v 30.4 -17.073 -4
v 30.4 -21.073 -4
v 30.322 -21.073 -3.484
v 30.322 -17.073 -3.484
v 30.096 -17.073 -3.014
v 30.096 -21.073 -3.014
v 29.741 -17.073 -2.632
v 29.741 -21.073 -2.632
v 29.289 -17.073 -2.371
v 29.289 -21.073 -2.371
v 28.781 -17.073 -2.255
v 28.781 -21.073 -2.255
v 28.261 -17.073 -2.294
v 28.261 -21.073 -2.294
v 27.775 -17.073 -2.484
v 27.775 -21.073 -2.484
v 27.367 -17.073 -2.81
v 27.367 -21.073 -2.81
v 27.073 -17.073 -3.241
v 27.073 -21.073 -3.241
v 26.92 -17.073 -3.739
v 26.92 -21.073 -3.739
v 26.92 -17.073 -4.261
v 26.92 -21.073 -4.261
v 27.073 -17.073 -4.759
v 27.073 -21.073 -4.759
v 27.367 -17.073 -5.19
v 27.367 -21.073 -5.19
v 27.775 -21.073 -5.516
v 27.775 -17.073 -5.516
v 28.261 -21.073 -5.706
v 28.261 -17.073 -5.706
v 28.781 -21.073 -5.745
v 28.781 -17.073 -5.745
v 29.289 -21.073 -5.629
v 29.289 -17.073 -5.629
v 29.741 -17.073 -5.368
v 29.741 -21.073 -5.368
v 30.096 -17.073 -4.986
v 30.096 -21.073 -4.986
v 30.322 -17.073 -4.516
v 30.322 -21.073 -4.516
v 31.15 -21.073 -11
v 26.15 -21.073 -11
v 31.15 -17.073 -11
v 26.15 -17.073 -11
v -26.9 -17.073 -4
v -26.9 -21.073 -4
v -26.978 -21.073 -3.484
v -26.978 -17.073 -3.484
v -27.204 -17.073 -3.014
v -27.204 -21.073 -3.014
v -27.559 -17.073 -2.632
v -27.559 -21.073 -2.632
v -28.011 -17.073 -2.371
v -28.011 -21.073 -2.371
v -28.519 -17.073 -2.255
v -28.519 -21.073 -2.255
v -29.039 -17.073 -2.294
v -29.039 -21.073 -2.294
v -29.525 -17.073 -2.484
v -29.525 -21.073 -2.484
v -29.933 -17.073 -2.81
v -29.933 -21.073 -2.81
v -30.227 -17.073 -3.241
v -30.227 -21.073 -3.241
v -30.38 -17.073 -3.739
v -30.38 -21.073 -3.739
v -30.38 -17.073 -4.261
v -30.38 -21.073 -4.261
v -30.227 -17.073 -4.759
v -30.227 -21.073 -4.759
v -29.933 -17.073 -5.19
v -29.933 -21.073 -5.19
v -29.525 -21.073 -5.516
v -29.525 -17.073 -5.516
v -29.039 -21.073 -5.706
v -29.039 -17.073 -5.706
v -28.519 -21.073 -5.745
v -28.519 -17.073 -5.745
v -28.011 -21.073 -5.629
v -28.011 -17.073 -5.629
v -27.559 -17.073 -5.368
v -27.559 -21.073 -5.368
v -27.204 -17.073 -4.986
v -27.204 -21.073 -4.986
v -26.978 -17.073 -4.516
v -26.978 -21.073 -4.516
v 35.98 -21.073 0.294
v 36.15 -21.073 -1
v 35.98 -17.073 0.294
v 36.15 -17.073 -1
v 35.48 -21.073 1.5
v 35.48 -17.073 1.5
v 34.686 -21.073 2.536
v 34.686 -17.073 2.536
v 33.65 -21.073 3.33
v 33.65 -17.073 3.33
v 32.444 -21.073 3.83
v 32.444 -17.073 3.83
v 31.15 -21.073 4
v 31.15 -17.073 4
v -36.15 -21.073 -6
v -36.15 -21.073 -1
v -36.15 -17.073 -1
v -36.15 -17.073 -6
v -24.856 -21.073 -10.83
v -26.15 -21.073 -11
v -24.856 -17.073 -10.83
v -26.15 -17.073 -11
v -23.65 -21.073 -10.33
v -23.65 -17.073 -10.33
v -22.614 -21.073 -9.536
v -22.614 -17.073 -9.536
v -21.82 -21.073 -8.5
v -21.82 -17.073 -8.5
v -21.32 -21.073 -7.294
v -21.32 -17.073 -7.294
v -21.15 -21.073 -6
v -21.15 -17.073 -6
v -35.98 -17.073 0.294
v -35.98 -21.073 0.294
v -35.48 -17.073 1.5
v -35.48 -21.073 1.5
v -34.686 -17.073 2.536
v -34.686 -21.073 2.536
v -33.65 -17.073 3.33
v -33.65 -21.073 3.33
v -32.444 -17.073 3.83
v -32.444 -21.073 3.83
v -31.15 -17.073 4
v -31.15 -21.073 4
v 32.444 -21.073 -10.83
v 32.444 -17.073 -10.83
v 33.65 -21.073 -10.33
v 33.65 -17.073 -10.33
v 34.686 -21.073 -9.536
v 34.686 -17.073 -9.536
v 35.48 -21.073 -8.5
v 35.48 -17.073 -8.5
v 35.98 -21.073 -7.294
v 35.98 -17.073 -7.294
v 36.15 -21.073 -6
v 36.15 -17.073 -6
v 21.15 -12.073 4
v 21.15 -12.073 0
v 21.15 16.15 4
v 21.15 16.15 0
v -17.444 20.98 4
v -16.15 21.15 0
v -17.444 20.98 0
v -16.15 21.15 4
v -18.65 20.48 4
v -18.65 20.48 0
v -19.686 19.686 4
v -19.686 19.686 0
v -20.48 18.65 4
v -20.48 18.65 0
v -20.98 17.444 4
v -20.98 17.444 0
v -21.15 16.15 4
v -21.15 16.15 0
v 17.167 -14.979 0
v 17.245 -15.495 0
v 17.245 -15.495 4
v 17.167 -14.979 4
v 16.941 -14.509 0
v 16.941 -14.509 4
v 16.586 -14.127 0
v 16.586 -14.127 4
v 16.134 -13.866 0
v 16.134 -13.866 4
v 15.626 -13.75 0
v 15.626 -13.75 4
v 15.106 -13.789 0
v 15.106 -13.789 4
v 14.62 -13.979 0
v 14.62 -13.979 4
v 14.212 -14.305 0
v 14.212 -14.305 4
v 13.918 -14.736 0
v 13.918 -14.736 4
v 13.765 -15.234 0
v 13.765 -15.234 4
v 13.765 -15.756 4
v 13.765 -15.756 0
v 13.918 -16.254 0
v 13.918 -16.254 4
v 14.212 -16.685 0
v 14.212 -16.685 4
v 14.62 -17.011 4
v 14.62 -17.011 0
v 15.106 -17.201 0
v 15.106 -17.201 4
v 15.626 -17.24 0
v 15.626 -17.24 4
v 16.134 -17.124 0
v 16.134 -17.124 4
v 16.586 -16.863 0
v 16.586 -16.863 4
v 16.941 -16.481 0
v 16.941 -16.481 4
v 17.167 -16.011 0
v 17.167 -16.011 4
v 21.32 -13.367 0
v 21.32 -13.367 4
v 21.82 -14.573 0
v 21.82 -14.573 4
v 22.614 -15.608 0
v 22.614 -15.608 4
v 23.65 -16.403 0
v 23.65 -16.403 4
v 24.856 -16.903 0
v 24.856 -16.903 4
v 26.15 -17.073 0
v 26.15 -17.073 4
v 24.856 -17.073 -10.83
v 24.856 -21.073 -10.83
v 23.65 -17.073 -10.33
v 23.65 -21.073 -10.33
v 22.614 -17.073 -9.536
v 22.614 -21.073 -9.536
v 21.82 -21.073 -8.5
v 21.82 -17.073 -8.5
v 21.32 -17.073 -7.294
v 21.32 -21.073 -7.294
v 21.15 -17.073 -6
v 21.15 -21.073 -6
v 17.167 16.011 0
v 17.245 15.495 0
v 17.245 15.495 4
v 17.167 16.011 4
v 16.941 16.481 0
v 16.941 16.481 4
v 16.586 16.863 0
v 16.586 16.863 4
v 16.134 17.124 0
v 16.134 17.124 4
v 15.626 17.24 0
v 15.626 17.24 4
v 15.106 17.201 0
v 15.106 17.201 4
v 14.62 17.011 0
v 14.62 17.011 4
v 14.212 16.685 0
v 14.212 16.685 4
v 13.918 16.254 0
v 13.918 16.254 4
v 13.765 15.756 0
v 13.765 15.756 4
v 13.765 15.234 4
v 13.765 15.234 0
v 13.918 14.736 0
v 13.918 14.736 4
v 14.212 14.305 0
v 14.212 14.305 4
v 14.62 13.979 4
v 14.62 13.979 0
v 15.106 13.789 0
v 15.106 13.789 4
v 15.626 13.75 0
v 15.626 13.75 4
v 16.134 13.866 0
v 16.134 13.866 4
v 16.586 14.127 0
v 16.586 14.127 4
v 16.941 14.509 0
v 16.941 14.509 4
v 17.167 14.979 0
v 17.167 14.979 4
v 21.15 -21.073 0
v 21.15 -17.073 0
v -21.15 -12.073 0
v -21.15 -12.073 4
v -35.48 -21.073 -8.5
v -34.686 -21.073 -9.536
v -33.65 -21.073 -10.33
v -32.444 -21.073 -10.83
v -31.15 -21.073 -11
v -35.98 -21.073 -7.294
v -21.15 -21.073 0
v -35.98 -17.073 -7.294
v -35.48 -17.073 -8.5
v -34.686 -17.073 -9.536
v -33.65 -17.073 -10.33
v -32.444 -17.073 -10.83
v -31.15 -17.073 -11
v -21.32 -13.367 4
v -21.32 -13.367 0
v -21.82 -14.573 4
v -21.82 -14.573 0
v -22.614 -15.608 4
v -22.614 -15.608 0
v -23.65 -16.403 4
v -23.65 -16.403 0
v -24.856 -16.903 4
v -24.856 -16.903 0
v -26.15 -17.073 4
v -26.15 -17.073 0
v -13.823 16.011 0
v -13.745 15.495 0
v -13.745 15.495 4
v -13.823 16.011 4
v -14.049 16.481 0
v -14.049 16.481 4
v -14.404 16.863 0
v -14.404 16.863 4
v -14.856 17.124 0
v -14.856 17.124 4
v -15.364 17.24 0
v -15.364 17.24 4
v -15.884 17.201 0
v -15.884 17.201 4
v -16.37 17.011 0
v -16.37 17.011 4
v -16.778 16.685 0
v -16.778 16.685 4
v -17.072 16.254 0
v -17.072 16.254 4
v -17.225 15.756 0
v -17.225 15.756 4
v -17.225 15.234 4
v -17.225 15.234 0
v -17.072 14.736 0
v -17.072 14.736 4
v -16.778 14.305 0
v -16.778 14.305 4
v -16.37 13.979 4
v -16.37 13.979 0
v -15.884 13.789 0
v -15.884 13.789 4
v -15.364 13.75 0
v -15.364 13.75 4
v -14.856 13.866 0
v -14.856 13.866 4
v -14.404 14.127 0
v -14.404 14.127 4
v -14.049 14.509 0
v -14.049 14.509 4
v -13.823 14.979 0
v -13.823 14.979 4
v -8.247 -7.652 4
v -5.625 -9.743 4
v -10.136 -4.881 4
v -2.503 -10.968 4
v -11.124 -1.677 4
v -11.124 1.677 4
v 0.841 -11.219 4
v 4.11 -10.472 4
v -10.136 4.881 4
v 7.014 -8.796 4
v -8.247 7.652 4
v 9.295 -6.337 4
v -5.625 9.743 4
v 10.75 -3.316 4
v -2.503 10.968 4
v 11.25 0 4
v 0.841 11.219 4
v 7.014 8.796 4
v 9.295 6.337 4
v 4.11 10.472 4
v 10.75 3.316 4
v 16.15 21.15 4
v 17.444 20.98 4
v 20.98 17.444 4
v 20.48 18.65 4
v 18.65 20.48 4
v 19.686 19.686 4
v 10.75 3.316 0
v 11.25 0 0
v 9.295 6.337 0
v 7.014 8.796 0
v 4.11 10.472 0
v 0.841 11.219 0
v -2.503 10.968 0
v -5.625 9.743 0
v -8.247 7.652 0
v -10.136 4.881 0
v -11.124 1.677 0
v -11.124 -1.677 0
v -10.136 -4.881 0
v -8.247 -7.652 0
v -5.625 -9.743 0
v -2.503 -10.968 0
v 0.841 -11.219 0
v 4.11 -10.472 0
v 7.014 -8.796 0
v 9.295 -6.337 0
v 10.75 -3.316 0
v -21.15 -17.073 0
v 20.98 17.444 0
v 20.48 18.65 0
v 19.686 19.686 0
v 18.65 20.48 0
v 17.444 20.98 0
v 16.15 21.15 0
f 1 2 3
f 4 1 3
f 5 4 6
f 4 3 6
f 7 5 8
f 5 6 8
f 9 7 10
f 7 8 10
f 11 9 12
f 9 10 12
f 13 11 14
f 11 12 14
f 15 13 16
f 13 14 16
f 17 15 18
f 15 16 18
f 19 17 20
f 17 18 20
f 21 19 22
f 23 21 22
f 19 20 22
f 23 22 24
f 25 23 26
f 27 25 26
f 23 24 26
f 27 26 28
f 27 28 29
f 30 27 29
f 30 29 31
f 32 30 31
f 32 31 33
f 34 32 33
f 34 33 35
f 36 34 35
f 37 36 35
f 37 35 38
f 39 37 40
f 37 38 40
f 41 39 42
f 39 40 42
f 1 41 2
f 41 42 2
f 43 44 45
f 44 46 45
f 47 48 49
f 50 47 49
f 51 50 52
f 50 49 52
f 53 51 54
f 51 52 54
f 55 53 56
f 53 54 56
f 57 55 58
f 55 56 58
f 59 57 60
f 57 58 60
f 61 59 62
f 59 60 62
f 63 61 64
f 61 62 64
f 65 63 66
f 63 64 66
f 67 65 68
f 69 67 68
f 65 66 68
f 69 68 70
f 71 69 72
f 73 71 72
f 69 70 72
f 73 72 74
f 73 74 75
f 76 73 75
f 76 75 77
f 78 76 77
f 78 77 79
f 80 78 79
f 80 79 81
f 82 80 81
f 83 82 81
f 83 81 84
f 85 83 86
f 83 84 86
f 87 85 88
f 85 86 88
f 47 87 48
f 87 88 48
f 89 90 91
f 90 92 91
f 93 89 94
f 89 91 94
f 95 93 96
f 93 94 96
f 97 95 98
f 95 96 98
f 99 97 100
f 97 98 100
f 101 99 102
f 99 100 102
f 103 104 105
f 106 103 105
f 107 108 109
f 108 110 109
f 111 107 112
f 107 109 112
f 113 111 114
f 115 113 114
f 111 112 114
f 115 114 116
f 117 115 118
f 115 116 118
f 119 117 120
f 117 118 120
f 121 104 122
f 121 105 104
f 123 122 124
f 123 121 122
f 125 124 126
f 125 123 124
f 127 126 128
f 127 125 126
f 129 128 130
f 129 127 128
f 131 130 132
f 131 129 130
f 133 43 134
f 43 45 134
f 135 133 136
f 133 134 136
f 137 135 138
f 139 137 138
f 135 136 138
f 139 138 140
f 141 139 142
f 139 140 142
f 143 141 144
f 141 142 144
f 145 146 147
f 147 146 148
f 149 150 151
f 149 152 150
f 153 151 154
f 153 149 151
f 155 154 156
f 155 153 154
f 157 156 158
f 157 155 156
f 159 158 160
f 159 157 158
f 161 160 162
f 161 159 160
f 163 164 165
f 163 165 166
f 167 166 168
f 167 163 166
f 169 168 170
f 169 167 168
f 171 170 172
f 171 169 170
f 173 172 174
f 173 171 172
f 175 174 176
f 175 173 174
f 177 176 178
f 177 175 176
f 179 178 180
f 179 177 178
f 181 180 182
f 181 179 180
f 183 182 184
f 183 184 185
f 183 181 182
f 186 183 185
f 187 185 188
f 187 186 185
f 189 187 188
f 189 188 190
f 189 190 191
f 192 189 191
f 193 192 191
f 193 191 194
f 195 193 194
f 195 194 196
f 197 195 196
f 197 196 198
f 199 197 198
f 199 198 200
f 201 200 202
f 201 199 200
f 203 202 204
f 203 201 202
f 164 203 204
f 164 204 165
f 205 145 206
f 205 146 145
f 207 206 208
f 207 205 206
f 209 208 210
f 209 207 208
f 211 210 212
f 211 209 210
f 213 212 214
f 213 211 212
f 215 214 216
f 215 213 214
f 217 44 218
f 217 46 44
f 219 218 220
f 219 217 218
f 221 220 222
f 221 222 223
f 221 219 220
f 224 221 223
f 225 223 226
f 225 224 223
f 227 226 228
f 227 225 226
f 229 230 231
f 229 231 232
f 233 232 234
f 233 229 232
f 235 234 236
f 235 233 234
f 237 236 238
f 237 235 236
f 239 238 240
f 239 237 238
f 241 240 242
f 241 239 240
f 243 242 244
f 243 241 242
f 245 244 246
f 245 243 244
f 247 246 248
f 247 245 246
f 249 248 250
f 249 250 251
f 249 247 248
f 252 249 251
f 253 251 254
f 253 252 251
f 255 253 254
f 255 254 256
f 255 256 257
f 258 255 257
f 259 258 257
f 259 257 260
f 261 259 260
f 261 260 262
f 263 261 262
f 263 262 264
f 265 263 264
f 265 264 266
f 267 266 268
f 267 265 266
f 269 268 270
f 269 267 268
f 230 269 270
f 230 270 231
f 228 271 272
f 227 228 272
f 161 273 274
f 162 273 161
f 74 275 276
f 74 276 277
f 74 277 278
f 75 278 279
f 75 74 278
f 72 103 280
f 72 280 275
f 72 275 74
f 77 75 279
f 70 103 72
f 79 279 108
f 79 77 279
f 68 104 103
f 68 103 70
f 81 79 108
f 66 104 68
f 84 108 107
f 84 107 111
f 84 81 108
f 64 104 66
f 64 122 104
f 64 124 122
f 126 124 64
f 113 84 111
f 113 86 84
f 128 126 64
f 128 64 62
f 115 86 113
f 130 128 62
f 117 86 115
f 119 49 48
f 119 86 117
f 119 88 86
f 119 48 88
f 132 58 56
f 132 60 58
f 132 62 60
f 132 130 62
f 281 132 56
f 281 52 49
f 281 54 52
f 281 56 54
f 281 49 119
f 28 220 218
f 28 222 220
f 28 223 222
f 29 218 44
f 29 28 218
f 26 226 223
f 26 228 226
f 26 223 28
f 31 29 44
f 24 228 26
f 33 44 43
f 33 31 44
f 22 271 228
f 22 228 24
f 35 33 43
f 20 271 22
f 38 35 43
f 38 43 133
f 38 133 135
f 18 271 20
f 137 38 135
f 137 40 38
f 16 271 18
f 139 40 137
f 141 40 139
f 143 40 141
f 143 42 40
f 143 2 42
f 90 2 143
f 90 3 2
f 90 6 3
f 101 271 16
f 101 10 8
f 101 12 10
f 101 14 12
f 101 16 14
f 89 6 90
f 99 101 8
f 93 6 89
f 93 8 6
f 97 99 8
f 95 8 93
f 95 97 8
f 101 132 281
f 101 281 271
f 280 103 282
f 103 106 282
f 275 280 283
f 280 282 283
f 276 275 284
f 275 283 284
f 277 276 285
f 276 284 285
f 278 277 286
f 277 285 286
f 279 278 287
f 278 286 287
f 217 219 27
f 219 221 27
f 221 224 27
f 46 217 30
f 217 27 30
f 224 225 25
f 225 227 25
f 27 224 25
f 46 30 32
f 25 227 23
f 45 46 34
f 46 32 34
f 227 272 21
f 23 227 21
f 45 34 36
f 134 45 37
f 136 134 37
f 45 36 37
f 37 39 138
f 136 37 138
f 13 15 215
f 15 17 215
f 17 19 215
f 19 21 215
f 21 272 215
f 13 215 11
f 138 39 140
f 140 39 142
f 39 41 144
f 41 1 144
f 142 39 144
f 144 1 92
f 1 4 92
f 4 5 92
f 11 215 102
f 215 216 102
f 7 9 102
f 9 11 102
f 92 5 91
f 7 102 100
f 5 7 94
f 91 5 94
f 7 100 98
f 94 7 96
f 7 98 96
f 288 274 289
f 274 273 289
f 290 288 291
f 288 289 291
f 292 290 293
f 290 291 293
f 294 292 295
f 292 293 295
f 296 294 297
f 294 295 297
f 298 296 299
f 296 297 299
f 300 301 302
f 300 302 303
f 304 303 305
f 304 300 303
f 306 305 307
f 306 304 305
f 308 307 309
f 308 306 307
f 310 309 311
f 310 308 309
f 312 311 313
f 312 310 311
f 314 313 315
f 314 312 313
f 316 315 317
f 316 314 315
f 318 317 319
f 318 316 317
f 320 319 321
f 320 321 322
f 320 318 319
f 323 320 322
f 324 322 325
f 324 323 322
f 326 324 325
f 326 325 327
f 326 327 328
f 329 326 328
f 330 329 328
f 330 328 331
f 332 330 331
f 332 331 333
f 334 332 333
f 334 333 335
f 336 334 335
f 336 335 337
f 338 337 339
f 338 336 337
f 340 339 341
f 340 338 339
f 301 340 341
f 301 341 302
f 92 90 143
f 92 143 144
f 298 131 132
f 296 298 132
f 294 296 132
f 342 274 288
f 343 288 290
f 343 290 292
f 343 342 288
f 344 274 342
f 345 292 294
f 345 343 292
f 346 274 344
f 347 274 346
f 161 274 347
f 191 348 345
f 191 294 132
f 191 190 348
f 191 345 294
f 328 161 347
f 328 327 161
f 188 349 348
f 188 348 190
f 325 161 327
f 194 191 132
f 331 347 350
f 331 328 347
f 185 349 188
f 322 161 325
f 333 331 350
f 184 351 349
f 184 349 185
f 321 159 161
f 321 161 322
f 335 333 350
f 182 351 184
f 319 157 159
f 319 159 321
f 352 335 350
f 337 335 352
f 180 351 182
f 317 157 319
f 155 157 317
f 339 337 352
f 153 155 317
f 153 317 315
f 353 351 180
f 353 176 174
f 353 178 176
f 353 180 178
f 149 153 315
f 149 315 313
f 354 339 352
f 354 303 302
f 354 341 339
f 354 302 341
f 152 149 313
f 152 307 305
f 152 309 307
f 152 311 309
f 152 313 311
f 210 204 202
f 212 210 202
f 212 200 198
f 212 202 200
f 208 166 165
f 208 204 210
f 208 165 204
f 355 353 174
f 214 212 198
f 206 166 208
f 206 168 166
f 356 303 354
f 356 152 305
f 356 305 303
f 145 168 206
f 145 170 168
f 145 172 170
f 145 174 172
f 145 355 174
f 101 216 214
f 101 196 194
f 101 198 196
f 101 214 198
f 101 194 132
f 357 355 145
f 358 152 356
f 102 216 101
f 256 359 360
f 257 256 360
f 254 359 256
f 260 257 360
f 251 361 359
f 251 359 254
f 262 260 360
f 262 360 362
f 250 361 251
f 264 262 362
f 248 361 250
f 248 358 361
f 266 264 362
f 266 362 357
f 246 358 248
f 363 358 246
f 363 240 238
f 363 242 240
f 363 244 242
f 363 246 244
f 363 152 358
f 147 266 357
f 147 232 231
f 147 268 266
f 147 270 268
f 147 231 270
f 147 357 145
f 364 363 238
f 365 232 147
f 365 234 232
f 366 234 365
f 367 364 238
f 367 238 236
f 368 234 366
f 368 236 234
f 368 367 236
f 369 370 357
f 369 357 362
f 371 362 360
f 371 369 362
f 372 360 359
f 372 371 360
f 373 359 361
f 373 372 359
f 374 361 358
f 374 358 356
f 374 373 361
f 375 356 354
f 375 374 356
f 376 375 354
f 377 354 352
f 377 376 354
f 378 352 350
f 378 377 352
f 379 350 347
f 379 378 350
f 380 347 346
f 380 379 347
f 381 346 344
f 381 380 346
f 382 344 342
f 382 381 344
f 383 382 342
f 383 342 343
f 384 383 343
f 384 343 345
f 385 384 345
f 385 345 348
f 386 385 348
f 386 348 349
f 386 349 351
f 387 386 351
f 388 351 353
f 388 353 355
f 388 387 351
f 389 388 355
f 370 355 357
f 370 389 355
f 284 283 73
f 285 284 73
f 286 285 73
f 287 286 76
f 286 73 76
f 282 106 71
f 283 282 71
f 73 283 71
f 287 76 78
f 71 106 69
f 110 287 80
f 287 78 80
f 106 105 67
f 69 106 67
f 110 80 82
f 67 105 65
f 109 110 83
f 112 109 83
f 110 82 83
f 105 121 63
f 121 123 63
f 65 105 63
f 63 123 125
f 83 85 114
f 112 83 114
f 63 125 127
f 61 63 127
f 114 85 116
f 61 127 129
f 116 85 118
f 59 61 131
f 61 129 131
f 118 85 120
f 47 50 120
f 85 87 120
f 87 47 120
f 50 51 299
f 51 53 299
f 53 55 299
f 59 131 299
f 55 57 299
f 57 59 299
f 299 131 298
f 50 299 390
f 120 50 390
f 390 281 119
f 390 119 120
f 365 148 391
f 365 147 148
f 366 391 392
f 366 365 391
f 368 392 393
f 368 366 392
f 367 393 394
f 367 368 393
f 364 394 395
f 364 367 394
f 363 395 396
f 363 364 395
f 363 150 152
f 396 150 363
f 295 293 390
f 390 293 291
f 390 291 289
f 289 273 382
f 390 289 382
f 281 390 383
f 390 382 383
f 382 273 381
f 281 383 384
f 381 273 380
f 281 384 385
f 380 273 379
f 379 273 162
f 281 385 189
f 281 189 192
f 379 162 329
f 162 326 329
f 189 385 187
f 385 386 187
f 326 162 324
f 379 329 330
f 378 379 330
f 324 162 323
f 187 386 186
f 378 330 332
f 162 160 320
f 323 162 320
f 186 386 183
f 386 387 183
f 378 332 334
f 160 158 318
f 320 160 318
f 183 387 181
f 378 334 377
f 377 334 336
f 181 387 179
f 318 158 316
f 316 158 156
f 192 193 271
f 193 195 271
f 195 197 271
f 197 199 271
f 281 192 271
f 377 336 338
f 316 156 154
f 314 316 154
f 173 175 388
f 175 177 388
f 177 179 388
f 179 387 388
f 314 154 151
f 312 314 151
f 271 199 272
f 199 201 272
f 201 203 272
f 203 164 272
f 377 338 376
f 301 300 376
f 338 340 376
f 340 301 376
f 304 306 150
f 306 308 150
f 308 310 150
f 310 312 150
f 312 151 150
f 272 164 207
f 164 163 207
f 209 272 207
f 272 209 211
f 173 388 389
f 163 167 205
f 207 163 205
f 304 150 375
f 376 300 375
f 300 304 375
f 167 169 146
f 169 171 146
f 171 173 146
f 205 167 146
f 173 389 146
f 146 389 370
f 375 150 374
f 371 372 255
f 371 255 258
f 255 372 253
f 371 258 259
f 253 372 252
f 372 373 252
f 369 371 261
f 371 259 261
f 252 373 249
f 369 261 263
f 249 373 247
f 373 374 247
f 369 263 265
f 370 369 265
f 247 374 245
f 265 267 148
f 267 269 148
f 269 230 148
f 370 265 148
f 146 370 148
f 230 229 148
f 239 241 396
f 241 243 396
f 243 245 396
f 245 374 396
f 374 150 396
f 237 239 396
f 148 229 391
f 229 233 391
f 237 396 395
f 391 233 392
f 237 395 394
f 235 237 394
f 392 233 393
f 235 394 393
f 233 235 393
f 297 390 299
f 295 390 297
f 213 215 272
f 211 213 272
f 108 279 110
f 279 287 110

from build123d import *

# Parameters (mm, degrees)
F0_W     = 42.3
F0_H     = 42.2228726387
F0_R     = 1.75
F0_R_2   = 11.25
F1_DEPTH = 4
F2_W     = 15
F2_H     = 4
F3_DEPTH = 15
F4_R     = 5
F5_R     = 1.75
F6_DEPTH = 4


with BuildPart() as f1:
    # F0 (on Top) → F1 (new body)
    with BuildSketch(Plane.XY):
        with Locations((0, 0.0385636806)):
            Rectangle(F0_W, F0_H)
        with Locations((15.495, -15.495)):
            Circle(F0_R, mode=Mode.SUBTRACT)
        Circle(F0_R_2, mode=Mode.SUBTRACT)
        with Locations((-15.495, 15.495)):
            Circle(F0_R, mode=Mode.SUBTRACT)
        with Locations((15.495, 15.495)):
            Circle(F0_R, mode=Mode.SUBTRACT)
    extrude(amount=F1_DEPTH)

    # F2 (on face) → F3 (join)
    with BuildSketch(Plane.XY.offset(4)):
        with Locations((-28.65, -19.0728726387)):
            Rectangle(F2_W, F2_H)
        with Locations((28.65, -19.0728726387)):
            Rectangle(F2_W, F2_H)
    extrude(amount=-F3_DEPTH)

    # F4
    f4_edges = [f1.edges().sort_by_distance(p)[0] for p in [
        (21.15, 21.15, 2),
        (-21.15, 21.15, 2),
        (-21.15, -17.072873, 2),
        (21.15, -17.072873, 2),
        (36.15, -19.072873, 4),
        (-36.15, -19.072873, 4),
        (36.15, -19.072873, -11),
        (21.15, -19.072873, -11),
        (-21.15, -19.072873, -11),
        (-36.15, -19.072873, -11),
    ]]
    fillet(f4_edges, radius=F4_R)

    # F5 (on face) → F6 (cut, through all)
    with BuildSketch(Plane.XZ.offset(21.0728726387)):
        with Locations((-28.65, -4)):
            Circle(F5_R)
        with Locations((28.65, -4)):
            Circle(F5_R)
    extrude(amount=-F6_DEPTH, mode=Mode.SUBTRACT)


solid = f1.part
